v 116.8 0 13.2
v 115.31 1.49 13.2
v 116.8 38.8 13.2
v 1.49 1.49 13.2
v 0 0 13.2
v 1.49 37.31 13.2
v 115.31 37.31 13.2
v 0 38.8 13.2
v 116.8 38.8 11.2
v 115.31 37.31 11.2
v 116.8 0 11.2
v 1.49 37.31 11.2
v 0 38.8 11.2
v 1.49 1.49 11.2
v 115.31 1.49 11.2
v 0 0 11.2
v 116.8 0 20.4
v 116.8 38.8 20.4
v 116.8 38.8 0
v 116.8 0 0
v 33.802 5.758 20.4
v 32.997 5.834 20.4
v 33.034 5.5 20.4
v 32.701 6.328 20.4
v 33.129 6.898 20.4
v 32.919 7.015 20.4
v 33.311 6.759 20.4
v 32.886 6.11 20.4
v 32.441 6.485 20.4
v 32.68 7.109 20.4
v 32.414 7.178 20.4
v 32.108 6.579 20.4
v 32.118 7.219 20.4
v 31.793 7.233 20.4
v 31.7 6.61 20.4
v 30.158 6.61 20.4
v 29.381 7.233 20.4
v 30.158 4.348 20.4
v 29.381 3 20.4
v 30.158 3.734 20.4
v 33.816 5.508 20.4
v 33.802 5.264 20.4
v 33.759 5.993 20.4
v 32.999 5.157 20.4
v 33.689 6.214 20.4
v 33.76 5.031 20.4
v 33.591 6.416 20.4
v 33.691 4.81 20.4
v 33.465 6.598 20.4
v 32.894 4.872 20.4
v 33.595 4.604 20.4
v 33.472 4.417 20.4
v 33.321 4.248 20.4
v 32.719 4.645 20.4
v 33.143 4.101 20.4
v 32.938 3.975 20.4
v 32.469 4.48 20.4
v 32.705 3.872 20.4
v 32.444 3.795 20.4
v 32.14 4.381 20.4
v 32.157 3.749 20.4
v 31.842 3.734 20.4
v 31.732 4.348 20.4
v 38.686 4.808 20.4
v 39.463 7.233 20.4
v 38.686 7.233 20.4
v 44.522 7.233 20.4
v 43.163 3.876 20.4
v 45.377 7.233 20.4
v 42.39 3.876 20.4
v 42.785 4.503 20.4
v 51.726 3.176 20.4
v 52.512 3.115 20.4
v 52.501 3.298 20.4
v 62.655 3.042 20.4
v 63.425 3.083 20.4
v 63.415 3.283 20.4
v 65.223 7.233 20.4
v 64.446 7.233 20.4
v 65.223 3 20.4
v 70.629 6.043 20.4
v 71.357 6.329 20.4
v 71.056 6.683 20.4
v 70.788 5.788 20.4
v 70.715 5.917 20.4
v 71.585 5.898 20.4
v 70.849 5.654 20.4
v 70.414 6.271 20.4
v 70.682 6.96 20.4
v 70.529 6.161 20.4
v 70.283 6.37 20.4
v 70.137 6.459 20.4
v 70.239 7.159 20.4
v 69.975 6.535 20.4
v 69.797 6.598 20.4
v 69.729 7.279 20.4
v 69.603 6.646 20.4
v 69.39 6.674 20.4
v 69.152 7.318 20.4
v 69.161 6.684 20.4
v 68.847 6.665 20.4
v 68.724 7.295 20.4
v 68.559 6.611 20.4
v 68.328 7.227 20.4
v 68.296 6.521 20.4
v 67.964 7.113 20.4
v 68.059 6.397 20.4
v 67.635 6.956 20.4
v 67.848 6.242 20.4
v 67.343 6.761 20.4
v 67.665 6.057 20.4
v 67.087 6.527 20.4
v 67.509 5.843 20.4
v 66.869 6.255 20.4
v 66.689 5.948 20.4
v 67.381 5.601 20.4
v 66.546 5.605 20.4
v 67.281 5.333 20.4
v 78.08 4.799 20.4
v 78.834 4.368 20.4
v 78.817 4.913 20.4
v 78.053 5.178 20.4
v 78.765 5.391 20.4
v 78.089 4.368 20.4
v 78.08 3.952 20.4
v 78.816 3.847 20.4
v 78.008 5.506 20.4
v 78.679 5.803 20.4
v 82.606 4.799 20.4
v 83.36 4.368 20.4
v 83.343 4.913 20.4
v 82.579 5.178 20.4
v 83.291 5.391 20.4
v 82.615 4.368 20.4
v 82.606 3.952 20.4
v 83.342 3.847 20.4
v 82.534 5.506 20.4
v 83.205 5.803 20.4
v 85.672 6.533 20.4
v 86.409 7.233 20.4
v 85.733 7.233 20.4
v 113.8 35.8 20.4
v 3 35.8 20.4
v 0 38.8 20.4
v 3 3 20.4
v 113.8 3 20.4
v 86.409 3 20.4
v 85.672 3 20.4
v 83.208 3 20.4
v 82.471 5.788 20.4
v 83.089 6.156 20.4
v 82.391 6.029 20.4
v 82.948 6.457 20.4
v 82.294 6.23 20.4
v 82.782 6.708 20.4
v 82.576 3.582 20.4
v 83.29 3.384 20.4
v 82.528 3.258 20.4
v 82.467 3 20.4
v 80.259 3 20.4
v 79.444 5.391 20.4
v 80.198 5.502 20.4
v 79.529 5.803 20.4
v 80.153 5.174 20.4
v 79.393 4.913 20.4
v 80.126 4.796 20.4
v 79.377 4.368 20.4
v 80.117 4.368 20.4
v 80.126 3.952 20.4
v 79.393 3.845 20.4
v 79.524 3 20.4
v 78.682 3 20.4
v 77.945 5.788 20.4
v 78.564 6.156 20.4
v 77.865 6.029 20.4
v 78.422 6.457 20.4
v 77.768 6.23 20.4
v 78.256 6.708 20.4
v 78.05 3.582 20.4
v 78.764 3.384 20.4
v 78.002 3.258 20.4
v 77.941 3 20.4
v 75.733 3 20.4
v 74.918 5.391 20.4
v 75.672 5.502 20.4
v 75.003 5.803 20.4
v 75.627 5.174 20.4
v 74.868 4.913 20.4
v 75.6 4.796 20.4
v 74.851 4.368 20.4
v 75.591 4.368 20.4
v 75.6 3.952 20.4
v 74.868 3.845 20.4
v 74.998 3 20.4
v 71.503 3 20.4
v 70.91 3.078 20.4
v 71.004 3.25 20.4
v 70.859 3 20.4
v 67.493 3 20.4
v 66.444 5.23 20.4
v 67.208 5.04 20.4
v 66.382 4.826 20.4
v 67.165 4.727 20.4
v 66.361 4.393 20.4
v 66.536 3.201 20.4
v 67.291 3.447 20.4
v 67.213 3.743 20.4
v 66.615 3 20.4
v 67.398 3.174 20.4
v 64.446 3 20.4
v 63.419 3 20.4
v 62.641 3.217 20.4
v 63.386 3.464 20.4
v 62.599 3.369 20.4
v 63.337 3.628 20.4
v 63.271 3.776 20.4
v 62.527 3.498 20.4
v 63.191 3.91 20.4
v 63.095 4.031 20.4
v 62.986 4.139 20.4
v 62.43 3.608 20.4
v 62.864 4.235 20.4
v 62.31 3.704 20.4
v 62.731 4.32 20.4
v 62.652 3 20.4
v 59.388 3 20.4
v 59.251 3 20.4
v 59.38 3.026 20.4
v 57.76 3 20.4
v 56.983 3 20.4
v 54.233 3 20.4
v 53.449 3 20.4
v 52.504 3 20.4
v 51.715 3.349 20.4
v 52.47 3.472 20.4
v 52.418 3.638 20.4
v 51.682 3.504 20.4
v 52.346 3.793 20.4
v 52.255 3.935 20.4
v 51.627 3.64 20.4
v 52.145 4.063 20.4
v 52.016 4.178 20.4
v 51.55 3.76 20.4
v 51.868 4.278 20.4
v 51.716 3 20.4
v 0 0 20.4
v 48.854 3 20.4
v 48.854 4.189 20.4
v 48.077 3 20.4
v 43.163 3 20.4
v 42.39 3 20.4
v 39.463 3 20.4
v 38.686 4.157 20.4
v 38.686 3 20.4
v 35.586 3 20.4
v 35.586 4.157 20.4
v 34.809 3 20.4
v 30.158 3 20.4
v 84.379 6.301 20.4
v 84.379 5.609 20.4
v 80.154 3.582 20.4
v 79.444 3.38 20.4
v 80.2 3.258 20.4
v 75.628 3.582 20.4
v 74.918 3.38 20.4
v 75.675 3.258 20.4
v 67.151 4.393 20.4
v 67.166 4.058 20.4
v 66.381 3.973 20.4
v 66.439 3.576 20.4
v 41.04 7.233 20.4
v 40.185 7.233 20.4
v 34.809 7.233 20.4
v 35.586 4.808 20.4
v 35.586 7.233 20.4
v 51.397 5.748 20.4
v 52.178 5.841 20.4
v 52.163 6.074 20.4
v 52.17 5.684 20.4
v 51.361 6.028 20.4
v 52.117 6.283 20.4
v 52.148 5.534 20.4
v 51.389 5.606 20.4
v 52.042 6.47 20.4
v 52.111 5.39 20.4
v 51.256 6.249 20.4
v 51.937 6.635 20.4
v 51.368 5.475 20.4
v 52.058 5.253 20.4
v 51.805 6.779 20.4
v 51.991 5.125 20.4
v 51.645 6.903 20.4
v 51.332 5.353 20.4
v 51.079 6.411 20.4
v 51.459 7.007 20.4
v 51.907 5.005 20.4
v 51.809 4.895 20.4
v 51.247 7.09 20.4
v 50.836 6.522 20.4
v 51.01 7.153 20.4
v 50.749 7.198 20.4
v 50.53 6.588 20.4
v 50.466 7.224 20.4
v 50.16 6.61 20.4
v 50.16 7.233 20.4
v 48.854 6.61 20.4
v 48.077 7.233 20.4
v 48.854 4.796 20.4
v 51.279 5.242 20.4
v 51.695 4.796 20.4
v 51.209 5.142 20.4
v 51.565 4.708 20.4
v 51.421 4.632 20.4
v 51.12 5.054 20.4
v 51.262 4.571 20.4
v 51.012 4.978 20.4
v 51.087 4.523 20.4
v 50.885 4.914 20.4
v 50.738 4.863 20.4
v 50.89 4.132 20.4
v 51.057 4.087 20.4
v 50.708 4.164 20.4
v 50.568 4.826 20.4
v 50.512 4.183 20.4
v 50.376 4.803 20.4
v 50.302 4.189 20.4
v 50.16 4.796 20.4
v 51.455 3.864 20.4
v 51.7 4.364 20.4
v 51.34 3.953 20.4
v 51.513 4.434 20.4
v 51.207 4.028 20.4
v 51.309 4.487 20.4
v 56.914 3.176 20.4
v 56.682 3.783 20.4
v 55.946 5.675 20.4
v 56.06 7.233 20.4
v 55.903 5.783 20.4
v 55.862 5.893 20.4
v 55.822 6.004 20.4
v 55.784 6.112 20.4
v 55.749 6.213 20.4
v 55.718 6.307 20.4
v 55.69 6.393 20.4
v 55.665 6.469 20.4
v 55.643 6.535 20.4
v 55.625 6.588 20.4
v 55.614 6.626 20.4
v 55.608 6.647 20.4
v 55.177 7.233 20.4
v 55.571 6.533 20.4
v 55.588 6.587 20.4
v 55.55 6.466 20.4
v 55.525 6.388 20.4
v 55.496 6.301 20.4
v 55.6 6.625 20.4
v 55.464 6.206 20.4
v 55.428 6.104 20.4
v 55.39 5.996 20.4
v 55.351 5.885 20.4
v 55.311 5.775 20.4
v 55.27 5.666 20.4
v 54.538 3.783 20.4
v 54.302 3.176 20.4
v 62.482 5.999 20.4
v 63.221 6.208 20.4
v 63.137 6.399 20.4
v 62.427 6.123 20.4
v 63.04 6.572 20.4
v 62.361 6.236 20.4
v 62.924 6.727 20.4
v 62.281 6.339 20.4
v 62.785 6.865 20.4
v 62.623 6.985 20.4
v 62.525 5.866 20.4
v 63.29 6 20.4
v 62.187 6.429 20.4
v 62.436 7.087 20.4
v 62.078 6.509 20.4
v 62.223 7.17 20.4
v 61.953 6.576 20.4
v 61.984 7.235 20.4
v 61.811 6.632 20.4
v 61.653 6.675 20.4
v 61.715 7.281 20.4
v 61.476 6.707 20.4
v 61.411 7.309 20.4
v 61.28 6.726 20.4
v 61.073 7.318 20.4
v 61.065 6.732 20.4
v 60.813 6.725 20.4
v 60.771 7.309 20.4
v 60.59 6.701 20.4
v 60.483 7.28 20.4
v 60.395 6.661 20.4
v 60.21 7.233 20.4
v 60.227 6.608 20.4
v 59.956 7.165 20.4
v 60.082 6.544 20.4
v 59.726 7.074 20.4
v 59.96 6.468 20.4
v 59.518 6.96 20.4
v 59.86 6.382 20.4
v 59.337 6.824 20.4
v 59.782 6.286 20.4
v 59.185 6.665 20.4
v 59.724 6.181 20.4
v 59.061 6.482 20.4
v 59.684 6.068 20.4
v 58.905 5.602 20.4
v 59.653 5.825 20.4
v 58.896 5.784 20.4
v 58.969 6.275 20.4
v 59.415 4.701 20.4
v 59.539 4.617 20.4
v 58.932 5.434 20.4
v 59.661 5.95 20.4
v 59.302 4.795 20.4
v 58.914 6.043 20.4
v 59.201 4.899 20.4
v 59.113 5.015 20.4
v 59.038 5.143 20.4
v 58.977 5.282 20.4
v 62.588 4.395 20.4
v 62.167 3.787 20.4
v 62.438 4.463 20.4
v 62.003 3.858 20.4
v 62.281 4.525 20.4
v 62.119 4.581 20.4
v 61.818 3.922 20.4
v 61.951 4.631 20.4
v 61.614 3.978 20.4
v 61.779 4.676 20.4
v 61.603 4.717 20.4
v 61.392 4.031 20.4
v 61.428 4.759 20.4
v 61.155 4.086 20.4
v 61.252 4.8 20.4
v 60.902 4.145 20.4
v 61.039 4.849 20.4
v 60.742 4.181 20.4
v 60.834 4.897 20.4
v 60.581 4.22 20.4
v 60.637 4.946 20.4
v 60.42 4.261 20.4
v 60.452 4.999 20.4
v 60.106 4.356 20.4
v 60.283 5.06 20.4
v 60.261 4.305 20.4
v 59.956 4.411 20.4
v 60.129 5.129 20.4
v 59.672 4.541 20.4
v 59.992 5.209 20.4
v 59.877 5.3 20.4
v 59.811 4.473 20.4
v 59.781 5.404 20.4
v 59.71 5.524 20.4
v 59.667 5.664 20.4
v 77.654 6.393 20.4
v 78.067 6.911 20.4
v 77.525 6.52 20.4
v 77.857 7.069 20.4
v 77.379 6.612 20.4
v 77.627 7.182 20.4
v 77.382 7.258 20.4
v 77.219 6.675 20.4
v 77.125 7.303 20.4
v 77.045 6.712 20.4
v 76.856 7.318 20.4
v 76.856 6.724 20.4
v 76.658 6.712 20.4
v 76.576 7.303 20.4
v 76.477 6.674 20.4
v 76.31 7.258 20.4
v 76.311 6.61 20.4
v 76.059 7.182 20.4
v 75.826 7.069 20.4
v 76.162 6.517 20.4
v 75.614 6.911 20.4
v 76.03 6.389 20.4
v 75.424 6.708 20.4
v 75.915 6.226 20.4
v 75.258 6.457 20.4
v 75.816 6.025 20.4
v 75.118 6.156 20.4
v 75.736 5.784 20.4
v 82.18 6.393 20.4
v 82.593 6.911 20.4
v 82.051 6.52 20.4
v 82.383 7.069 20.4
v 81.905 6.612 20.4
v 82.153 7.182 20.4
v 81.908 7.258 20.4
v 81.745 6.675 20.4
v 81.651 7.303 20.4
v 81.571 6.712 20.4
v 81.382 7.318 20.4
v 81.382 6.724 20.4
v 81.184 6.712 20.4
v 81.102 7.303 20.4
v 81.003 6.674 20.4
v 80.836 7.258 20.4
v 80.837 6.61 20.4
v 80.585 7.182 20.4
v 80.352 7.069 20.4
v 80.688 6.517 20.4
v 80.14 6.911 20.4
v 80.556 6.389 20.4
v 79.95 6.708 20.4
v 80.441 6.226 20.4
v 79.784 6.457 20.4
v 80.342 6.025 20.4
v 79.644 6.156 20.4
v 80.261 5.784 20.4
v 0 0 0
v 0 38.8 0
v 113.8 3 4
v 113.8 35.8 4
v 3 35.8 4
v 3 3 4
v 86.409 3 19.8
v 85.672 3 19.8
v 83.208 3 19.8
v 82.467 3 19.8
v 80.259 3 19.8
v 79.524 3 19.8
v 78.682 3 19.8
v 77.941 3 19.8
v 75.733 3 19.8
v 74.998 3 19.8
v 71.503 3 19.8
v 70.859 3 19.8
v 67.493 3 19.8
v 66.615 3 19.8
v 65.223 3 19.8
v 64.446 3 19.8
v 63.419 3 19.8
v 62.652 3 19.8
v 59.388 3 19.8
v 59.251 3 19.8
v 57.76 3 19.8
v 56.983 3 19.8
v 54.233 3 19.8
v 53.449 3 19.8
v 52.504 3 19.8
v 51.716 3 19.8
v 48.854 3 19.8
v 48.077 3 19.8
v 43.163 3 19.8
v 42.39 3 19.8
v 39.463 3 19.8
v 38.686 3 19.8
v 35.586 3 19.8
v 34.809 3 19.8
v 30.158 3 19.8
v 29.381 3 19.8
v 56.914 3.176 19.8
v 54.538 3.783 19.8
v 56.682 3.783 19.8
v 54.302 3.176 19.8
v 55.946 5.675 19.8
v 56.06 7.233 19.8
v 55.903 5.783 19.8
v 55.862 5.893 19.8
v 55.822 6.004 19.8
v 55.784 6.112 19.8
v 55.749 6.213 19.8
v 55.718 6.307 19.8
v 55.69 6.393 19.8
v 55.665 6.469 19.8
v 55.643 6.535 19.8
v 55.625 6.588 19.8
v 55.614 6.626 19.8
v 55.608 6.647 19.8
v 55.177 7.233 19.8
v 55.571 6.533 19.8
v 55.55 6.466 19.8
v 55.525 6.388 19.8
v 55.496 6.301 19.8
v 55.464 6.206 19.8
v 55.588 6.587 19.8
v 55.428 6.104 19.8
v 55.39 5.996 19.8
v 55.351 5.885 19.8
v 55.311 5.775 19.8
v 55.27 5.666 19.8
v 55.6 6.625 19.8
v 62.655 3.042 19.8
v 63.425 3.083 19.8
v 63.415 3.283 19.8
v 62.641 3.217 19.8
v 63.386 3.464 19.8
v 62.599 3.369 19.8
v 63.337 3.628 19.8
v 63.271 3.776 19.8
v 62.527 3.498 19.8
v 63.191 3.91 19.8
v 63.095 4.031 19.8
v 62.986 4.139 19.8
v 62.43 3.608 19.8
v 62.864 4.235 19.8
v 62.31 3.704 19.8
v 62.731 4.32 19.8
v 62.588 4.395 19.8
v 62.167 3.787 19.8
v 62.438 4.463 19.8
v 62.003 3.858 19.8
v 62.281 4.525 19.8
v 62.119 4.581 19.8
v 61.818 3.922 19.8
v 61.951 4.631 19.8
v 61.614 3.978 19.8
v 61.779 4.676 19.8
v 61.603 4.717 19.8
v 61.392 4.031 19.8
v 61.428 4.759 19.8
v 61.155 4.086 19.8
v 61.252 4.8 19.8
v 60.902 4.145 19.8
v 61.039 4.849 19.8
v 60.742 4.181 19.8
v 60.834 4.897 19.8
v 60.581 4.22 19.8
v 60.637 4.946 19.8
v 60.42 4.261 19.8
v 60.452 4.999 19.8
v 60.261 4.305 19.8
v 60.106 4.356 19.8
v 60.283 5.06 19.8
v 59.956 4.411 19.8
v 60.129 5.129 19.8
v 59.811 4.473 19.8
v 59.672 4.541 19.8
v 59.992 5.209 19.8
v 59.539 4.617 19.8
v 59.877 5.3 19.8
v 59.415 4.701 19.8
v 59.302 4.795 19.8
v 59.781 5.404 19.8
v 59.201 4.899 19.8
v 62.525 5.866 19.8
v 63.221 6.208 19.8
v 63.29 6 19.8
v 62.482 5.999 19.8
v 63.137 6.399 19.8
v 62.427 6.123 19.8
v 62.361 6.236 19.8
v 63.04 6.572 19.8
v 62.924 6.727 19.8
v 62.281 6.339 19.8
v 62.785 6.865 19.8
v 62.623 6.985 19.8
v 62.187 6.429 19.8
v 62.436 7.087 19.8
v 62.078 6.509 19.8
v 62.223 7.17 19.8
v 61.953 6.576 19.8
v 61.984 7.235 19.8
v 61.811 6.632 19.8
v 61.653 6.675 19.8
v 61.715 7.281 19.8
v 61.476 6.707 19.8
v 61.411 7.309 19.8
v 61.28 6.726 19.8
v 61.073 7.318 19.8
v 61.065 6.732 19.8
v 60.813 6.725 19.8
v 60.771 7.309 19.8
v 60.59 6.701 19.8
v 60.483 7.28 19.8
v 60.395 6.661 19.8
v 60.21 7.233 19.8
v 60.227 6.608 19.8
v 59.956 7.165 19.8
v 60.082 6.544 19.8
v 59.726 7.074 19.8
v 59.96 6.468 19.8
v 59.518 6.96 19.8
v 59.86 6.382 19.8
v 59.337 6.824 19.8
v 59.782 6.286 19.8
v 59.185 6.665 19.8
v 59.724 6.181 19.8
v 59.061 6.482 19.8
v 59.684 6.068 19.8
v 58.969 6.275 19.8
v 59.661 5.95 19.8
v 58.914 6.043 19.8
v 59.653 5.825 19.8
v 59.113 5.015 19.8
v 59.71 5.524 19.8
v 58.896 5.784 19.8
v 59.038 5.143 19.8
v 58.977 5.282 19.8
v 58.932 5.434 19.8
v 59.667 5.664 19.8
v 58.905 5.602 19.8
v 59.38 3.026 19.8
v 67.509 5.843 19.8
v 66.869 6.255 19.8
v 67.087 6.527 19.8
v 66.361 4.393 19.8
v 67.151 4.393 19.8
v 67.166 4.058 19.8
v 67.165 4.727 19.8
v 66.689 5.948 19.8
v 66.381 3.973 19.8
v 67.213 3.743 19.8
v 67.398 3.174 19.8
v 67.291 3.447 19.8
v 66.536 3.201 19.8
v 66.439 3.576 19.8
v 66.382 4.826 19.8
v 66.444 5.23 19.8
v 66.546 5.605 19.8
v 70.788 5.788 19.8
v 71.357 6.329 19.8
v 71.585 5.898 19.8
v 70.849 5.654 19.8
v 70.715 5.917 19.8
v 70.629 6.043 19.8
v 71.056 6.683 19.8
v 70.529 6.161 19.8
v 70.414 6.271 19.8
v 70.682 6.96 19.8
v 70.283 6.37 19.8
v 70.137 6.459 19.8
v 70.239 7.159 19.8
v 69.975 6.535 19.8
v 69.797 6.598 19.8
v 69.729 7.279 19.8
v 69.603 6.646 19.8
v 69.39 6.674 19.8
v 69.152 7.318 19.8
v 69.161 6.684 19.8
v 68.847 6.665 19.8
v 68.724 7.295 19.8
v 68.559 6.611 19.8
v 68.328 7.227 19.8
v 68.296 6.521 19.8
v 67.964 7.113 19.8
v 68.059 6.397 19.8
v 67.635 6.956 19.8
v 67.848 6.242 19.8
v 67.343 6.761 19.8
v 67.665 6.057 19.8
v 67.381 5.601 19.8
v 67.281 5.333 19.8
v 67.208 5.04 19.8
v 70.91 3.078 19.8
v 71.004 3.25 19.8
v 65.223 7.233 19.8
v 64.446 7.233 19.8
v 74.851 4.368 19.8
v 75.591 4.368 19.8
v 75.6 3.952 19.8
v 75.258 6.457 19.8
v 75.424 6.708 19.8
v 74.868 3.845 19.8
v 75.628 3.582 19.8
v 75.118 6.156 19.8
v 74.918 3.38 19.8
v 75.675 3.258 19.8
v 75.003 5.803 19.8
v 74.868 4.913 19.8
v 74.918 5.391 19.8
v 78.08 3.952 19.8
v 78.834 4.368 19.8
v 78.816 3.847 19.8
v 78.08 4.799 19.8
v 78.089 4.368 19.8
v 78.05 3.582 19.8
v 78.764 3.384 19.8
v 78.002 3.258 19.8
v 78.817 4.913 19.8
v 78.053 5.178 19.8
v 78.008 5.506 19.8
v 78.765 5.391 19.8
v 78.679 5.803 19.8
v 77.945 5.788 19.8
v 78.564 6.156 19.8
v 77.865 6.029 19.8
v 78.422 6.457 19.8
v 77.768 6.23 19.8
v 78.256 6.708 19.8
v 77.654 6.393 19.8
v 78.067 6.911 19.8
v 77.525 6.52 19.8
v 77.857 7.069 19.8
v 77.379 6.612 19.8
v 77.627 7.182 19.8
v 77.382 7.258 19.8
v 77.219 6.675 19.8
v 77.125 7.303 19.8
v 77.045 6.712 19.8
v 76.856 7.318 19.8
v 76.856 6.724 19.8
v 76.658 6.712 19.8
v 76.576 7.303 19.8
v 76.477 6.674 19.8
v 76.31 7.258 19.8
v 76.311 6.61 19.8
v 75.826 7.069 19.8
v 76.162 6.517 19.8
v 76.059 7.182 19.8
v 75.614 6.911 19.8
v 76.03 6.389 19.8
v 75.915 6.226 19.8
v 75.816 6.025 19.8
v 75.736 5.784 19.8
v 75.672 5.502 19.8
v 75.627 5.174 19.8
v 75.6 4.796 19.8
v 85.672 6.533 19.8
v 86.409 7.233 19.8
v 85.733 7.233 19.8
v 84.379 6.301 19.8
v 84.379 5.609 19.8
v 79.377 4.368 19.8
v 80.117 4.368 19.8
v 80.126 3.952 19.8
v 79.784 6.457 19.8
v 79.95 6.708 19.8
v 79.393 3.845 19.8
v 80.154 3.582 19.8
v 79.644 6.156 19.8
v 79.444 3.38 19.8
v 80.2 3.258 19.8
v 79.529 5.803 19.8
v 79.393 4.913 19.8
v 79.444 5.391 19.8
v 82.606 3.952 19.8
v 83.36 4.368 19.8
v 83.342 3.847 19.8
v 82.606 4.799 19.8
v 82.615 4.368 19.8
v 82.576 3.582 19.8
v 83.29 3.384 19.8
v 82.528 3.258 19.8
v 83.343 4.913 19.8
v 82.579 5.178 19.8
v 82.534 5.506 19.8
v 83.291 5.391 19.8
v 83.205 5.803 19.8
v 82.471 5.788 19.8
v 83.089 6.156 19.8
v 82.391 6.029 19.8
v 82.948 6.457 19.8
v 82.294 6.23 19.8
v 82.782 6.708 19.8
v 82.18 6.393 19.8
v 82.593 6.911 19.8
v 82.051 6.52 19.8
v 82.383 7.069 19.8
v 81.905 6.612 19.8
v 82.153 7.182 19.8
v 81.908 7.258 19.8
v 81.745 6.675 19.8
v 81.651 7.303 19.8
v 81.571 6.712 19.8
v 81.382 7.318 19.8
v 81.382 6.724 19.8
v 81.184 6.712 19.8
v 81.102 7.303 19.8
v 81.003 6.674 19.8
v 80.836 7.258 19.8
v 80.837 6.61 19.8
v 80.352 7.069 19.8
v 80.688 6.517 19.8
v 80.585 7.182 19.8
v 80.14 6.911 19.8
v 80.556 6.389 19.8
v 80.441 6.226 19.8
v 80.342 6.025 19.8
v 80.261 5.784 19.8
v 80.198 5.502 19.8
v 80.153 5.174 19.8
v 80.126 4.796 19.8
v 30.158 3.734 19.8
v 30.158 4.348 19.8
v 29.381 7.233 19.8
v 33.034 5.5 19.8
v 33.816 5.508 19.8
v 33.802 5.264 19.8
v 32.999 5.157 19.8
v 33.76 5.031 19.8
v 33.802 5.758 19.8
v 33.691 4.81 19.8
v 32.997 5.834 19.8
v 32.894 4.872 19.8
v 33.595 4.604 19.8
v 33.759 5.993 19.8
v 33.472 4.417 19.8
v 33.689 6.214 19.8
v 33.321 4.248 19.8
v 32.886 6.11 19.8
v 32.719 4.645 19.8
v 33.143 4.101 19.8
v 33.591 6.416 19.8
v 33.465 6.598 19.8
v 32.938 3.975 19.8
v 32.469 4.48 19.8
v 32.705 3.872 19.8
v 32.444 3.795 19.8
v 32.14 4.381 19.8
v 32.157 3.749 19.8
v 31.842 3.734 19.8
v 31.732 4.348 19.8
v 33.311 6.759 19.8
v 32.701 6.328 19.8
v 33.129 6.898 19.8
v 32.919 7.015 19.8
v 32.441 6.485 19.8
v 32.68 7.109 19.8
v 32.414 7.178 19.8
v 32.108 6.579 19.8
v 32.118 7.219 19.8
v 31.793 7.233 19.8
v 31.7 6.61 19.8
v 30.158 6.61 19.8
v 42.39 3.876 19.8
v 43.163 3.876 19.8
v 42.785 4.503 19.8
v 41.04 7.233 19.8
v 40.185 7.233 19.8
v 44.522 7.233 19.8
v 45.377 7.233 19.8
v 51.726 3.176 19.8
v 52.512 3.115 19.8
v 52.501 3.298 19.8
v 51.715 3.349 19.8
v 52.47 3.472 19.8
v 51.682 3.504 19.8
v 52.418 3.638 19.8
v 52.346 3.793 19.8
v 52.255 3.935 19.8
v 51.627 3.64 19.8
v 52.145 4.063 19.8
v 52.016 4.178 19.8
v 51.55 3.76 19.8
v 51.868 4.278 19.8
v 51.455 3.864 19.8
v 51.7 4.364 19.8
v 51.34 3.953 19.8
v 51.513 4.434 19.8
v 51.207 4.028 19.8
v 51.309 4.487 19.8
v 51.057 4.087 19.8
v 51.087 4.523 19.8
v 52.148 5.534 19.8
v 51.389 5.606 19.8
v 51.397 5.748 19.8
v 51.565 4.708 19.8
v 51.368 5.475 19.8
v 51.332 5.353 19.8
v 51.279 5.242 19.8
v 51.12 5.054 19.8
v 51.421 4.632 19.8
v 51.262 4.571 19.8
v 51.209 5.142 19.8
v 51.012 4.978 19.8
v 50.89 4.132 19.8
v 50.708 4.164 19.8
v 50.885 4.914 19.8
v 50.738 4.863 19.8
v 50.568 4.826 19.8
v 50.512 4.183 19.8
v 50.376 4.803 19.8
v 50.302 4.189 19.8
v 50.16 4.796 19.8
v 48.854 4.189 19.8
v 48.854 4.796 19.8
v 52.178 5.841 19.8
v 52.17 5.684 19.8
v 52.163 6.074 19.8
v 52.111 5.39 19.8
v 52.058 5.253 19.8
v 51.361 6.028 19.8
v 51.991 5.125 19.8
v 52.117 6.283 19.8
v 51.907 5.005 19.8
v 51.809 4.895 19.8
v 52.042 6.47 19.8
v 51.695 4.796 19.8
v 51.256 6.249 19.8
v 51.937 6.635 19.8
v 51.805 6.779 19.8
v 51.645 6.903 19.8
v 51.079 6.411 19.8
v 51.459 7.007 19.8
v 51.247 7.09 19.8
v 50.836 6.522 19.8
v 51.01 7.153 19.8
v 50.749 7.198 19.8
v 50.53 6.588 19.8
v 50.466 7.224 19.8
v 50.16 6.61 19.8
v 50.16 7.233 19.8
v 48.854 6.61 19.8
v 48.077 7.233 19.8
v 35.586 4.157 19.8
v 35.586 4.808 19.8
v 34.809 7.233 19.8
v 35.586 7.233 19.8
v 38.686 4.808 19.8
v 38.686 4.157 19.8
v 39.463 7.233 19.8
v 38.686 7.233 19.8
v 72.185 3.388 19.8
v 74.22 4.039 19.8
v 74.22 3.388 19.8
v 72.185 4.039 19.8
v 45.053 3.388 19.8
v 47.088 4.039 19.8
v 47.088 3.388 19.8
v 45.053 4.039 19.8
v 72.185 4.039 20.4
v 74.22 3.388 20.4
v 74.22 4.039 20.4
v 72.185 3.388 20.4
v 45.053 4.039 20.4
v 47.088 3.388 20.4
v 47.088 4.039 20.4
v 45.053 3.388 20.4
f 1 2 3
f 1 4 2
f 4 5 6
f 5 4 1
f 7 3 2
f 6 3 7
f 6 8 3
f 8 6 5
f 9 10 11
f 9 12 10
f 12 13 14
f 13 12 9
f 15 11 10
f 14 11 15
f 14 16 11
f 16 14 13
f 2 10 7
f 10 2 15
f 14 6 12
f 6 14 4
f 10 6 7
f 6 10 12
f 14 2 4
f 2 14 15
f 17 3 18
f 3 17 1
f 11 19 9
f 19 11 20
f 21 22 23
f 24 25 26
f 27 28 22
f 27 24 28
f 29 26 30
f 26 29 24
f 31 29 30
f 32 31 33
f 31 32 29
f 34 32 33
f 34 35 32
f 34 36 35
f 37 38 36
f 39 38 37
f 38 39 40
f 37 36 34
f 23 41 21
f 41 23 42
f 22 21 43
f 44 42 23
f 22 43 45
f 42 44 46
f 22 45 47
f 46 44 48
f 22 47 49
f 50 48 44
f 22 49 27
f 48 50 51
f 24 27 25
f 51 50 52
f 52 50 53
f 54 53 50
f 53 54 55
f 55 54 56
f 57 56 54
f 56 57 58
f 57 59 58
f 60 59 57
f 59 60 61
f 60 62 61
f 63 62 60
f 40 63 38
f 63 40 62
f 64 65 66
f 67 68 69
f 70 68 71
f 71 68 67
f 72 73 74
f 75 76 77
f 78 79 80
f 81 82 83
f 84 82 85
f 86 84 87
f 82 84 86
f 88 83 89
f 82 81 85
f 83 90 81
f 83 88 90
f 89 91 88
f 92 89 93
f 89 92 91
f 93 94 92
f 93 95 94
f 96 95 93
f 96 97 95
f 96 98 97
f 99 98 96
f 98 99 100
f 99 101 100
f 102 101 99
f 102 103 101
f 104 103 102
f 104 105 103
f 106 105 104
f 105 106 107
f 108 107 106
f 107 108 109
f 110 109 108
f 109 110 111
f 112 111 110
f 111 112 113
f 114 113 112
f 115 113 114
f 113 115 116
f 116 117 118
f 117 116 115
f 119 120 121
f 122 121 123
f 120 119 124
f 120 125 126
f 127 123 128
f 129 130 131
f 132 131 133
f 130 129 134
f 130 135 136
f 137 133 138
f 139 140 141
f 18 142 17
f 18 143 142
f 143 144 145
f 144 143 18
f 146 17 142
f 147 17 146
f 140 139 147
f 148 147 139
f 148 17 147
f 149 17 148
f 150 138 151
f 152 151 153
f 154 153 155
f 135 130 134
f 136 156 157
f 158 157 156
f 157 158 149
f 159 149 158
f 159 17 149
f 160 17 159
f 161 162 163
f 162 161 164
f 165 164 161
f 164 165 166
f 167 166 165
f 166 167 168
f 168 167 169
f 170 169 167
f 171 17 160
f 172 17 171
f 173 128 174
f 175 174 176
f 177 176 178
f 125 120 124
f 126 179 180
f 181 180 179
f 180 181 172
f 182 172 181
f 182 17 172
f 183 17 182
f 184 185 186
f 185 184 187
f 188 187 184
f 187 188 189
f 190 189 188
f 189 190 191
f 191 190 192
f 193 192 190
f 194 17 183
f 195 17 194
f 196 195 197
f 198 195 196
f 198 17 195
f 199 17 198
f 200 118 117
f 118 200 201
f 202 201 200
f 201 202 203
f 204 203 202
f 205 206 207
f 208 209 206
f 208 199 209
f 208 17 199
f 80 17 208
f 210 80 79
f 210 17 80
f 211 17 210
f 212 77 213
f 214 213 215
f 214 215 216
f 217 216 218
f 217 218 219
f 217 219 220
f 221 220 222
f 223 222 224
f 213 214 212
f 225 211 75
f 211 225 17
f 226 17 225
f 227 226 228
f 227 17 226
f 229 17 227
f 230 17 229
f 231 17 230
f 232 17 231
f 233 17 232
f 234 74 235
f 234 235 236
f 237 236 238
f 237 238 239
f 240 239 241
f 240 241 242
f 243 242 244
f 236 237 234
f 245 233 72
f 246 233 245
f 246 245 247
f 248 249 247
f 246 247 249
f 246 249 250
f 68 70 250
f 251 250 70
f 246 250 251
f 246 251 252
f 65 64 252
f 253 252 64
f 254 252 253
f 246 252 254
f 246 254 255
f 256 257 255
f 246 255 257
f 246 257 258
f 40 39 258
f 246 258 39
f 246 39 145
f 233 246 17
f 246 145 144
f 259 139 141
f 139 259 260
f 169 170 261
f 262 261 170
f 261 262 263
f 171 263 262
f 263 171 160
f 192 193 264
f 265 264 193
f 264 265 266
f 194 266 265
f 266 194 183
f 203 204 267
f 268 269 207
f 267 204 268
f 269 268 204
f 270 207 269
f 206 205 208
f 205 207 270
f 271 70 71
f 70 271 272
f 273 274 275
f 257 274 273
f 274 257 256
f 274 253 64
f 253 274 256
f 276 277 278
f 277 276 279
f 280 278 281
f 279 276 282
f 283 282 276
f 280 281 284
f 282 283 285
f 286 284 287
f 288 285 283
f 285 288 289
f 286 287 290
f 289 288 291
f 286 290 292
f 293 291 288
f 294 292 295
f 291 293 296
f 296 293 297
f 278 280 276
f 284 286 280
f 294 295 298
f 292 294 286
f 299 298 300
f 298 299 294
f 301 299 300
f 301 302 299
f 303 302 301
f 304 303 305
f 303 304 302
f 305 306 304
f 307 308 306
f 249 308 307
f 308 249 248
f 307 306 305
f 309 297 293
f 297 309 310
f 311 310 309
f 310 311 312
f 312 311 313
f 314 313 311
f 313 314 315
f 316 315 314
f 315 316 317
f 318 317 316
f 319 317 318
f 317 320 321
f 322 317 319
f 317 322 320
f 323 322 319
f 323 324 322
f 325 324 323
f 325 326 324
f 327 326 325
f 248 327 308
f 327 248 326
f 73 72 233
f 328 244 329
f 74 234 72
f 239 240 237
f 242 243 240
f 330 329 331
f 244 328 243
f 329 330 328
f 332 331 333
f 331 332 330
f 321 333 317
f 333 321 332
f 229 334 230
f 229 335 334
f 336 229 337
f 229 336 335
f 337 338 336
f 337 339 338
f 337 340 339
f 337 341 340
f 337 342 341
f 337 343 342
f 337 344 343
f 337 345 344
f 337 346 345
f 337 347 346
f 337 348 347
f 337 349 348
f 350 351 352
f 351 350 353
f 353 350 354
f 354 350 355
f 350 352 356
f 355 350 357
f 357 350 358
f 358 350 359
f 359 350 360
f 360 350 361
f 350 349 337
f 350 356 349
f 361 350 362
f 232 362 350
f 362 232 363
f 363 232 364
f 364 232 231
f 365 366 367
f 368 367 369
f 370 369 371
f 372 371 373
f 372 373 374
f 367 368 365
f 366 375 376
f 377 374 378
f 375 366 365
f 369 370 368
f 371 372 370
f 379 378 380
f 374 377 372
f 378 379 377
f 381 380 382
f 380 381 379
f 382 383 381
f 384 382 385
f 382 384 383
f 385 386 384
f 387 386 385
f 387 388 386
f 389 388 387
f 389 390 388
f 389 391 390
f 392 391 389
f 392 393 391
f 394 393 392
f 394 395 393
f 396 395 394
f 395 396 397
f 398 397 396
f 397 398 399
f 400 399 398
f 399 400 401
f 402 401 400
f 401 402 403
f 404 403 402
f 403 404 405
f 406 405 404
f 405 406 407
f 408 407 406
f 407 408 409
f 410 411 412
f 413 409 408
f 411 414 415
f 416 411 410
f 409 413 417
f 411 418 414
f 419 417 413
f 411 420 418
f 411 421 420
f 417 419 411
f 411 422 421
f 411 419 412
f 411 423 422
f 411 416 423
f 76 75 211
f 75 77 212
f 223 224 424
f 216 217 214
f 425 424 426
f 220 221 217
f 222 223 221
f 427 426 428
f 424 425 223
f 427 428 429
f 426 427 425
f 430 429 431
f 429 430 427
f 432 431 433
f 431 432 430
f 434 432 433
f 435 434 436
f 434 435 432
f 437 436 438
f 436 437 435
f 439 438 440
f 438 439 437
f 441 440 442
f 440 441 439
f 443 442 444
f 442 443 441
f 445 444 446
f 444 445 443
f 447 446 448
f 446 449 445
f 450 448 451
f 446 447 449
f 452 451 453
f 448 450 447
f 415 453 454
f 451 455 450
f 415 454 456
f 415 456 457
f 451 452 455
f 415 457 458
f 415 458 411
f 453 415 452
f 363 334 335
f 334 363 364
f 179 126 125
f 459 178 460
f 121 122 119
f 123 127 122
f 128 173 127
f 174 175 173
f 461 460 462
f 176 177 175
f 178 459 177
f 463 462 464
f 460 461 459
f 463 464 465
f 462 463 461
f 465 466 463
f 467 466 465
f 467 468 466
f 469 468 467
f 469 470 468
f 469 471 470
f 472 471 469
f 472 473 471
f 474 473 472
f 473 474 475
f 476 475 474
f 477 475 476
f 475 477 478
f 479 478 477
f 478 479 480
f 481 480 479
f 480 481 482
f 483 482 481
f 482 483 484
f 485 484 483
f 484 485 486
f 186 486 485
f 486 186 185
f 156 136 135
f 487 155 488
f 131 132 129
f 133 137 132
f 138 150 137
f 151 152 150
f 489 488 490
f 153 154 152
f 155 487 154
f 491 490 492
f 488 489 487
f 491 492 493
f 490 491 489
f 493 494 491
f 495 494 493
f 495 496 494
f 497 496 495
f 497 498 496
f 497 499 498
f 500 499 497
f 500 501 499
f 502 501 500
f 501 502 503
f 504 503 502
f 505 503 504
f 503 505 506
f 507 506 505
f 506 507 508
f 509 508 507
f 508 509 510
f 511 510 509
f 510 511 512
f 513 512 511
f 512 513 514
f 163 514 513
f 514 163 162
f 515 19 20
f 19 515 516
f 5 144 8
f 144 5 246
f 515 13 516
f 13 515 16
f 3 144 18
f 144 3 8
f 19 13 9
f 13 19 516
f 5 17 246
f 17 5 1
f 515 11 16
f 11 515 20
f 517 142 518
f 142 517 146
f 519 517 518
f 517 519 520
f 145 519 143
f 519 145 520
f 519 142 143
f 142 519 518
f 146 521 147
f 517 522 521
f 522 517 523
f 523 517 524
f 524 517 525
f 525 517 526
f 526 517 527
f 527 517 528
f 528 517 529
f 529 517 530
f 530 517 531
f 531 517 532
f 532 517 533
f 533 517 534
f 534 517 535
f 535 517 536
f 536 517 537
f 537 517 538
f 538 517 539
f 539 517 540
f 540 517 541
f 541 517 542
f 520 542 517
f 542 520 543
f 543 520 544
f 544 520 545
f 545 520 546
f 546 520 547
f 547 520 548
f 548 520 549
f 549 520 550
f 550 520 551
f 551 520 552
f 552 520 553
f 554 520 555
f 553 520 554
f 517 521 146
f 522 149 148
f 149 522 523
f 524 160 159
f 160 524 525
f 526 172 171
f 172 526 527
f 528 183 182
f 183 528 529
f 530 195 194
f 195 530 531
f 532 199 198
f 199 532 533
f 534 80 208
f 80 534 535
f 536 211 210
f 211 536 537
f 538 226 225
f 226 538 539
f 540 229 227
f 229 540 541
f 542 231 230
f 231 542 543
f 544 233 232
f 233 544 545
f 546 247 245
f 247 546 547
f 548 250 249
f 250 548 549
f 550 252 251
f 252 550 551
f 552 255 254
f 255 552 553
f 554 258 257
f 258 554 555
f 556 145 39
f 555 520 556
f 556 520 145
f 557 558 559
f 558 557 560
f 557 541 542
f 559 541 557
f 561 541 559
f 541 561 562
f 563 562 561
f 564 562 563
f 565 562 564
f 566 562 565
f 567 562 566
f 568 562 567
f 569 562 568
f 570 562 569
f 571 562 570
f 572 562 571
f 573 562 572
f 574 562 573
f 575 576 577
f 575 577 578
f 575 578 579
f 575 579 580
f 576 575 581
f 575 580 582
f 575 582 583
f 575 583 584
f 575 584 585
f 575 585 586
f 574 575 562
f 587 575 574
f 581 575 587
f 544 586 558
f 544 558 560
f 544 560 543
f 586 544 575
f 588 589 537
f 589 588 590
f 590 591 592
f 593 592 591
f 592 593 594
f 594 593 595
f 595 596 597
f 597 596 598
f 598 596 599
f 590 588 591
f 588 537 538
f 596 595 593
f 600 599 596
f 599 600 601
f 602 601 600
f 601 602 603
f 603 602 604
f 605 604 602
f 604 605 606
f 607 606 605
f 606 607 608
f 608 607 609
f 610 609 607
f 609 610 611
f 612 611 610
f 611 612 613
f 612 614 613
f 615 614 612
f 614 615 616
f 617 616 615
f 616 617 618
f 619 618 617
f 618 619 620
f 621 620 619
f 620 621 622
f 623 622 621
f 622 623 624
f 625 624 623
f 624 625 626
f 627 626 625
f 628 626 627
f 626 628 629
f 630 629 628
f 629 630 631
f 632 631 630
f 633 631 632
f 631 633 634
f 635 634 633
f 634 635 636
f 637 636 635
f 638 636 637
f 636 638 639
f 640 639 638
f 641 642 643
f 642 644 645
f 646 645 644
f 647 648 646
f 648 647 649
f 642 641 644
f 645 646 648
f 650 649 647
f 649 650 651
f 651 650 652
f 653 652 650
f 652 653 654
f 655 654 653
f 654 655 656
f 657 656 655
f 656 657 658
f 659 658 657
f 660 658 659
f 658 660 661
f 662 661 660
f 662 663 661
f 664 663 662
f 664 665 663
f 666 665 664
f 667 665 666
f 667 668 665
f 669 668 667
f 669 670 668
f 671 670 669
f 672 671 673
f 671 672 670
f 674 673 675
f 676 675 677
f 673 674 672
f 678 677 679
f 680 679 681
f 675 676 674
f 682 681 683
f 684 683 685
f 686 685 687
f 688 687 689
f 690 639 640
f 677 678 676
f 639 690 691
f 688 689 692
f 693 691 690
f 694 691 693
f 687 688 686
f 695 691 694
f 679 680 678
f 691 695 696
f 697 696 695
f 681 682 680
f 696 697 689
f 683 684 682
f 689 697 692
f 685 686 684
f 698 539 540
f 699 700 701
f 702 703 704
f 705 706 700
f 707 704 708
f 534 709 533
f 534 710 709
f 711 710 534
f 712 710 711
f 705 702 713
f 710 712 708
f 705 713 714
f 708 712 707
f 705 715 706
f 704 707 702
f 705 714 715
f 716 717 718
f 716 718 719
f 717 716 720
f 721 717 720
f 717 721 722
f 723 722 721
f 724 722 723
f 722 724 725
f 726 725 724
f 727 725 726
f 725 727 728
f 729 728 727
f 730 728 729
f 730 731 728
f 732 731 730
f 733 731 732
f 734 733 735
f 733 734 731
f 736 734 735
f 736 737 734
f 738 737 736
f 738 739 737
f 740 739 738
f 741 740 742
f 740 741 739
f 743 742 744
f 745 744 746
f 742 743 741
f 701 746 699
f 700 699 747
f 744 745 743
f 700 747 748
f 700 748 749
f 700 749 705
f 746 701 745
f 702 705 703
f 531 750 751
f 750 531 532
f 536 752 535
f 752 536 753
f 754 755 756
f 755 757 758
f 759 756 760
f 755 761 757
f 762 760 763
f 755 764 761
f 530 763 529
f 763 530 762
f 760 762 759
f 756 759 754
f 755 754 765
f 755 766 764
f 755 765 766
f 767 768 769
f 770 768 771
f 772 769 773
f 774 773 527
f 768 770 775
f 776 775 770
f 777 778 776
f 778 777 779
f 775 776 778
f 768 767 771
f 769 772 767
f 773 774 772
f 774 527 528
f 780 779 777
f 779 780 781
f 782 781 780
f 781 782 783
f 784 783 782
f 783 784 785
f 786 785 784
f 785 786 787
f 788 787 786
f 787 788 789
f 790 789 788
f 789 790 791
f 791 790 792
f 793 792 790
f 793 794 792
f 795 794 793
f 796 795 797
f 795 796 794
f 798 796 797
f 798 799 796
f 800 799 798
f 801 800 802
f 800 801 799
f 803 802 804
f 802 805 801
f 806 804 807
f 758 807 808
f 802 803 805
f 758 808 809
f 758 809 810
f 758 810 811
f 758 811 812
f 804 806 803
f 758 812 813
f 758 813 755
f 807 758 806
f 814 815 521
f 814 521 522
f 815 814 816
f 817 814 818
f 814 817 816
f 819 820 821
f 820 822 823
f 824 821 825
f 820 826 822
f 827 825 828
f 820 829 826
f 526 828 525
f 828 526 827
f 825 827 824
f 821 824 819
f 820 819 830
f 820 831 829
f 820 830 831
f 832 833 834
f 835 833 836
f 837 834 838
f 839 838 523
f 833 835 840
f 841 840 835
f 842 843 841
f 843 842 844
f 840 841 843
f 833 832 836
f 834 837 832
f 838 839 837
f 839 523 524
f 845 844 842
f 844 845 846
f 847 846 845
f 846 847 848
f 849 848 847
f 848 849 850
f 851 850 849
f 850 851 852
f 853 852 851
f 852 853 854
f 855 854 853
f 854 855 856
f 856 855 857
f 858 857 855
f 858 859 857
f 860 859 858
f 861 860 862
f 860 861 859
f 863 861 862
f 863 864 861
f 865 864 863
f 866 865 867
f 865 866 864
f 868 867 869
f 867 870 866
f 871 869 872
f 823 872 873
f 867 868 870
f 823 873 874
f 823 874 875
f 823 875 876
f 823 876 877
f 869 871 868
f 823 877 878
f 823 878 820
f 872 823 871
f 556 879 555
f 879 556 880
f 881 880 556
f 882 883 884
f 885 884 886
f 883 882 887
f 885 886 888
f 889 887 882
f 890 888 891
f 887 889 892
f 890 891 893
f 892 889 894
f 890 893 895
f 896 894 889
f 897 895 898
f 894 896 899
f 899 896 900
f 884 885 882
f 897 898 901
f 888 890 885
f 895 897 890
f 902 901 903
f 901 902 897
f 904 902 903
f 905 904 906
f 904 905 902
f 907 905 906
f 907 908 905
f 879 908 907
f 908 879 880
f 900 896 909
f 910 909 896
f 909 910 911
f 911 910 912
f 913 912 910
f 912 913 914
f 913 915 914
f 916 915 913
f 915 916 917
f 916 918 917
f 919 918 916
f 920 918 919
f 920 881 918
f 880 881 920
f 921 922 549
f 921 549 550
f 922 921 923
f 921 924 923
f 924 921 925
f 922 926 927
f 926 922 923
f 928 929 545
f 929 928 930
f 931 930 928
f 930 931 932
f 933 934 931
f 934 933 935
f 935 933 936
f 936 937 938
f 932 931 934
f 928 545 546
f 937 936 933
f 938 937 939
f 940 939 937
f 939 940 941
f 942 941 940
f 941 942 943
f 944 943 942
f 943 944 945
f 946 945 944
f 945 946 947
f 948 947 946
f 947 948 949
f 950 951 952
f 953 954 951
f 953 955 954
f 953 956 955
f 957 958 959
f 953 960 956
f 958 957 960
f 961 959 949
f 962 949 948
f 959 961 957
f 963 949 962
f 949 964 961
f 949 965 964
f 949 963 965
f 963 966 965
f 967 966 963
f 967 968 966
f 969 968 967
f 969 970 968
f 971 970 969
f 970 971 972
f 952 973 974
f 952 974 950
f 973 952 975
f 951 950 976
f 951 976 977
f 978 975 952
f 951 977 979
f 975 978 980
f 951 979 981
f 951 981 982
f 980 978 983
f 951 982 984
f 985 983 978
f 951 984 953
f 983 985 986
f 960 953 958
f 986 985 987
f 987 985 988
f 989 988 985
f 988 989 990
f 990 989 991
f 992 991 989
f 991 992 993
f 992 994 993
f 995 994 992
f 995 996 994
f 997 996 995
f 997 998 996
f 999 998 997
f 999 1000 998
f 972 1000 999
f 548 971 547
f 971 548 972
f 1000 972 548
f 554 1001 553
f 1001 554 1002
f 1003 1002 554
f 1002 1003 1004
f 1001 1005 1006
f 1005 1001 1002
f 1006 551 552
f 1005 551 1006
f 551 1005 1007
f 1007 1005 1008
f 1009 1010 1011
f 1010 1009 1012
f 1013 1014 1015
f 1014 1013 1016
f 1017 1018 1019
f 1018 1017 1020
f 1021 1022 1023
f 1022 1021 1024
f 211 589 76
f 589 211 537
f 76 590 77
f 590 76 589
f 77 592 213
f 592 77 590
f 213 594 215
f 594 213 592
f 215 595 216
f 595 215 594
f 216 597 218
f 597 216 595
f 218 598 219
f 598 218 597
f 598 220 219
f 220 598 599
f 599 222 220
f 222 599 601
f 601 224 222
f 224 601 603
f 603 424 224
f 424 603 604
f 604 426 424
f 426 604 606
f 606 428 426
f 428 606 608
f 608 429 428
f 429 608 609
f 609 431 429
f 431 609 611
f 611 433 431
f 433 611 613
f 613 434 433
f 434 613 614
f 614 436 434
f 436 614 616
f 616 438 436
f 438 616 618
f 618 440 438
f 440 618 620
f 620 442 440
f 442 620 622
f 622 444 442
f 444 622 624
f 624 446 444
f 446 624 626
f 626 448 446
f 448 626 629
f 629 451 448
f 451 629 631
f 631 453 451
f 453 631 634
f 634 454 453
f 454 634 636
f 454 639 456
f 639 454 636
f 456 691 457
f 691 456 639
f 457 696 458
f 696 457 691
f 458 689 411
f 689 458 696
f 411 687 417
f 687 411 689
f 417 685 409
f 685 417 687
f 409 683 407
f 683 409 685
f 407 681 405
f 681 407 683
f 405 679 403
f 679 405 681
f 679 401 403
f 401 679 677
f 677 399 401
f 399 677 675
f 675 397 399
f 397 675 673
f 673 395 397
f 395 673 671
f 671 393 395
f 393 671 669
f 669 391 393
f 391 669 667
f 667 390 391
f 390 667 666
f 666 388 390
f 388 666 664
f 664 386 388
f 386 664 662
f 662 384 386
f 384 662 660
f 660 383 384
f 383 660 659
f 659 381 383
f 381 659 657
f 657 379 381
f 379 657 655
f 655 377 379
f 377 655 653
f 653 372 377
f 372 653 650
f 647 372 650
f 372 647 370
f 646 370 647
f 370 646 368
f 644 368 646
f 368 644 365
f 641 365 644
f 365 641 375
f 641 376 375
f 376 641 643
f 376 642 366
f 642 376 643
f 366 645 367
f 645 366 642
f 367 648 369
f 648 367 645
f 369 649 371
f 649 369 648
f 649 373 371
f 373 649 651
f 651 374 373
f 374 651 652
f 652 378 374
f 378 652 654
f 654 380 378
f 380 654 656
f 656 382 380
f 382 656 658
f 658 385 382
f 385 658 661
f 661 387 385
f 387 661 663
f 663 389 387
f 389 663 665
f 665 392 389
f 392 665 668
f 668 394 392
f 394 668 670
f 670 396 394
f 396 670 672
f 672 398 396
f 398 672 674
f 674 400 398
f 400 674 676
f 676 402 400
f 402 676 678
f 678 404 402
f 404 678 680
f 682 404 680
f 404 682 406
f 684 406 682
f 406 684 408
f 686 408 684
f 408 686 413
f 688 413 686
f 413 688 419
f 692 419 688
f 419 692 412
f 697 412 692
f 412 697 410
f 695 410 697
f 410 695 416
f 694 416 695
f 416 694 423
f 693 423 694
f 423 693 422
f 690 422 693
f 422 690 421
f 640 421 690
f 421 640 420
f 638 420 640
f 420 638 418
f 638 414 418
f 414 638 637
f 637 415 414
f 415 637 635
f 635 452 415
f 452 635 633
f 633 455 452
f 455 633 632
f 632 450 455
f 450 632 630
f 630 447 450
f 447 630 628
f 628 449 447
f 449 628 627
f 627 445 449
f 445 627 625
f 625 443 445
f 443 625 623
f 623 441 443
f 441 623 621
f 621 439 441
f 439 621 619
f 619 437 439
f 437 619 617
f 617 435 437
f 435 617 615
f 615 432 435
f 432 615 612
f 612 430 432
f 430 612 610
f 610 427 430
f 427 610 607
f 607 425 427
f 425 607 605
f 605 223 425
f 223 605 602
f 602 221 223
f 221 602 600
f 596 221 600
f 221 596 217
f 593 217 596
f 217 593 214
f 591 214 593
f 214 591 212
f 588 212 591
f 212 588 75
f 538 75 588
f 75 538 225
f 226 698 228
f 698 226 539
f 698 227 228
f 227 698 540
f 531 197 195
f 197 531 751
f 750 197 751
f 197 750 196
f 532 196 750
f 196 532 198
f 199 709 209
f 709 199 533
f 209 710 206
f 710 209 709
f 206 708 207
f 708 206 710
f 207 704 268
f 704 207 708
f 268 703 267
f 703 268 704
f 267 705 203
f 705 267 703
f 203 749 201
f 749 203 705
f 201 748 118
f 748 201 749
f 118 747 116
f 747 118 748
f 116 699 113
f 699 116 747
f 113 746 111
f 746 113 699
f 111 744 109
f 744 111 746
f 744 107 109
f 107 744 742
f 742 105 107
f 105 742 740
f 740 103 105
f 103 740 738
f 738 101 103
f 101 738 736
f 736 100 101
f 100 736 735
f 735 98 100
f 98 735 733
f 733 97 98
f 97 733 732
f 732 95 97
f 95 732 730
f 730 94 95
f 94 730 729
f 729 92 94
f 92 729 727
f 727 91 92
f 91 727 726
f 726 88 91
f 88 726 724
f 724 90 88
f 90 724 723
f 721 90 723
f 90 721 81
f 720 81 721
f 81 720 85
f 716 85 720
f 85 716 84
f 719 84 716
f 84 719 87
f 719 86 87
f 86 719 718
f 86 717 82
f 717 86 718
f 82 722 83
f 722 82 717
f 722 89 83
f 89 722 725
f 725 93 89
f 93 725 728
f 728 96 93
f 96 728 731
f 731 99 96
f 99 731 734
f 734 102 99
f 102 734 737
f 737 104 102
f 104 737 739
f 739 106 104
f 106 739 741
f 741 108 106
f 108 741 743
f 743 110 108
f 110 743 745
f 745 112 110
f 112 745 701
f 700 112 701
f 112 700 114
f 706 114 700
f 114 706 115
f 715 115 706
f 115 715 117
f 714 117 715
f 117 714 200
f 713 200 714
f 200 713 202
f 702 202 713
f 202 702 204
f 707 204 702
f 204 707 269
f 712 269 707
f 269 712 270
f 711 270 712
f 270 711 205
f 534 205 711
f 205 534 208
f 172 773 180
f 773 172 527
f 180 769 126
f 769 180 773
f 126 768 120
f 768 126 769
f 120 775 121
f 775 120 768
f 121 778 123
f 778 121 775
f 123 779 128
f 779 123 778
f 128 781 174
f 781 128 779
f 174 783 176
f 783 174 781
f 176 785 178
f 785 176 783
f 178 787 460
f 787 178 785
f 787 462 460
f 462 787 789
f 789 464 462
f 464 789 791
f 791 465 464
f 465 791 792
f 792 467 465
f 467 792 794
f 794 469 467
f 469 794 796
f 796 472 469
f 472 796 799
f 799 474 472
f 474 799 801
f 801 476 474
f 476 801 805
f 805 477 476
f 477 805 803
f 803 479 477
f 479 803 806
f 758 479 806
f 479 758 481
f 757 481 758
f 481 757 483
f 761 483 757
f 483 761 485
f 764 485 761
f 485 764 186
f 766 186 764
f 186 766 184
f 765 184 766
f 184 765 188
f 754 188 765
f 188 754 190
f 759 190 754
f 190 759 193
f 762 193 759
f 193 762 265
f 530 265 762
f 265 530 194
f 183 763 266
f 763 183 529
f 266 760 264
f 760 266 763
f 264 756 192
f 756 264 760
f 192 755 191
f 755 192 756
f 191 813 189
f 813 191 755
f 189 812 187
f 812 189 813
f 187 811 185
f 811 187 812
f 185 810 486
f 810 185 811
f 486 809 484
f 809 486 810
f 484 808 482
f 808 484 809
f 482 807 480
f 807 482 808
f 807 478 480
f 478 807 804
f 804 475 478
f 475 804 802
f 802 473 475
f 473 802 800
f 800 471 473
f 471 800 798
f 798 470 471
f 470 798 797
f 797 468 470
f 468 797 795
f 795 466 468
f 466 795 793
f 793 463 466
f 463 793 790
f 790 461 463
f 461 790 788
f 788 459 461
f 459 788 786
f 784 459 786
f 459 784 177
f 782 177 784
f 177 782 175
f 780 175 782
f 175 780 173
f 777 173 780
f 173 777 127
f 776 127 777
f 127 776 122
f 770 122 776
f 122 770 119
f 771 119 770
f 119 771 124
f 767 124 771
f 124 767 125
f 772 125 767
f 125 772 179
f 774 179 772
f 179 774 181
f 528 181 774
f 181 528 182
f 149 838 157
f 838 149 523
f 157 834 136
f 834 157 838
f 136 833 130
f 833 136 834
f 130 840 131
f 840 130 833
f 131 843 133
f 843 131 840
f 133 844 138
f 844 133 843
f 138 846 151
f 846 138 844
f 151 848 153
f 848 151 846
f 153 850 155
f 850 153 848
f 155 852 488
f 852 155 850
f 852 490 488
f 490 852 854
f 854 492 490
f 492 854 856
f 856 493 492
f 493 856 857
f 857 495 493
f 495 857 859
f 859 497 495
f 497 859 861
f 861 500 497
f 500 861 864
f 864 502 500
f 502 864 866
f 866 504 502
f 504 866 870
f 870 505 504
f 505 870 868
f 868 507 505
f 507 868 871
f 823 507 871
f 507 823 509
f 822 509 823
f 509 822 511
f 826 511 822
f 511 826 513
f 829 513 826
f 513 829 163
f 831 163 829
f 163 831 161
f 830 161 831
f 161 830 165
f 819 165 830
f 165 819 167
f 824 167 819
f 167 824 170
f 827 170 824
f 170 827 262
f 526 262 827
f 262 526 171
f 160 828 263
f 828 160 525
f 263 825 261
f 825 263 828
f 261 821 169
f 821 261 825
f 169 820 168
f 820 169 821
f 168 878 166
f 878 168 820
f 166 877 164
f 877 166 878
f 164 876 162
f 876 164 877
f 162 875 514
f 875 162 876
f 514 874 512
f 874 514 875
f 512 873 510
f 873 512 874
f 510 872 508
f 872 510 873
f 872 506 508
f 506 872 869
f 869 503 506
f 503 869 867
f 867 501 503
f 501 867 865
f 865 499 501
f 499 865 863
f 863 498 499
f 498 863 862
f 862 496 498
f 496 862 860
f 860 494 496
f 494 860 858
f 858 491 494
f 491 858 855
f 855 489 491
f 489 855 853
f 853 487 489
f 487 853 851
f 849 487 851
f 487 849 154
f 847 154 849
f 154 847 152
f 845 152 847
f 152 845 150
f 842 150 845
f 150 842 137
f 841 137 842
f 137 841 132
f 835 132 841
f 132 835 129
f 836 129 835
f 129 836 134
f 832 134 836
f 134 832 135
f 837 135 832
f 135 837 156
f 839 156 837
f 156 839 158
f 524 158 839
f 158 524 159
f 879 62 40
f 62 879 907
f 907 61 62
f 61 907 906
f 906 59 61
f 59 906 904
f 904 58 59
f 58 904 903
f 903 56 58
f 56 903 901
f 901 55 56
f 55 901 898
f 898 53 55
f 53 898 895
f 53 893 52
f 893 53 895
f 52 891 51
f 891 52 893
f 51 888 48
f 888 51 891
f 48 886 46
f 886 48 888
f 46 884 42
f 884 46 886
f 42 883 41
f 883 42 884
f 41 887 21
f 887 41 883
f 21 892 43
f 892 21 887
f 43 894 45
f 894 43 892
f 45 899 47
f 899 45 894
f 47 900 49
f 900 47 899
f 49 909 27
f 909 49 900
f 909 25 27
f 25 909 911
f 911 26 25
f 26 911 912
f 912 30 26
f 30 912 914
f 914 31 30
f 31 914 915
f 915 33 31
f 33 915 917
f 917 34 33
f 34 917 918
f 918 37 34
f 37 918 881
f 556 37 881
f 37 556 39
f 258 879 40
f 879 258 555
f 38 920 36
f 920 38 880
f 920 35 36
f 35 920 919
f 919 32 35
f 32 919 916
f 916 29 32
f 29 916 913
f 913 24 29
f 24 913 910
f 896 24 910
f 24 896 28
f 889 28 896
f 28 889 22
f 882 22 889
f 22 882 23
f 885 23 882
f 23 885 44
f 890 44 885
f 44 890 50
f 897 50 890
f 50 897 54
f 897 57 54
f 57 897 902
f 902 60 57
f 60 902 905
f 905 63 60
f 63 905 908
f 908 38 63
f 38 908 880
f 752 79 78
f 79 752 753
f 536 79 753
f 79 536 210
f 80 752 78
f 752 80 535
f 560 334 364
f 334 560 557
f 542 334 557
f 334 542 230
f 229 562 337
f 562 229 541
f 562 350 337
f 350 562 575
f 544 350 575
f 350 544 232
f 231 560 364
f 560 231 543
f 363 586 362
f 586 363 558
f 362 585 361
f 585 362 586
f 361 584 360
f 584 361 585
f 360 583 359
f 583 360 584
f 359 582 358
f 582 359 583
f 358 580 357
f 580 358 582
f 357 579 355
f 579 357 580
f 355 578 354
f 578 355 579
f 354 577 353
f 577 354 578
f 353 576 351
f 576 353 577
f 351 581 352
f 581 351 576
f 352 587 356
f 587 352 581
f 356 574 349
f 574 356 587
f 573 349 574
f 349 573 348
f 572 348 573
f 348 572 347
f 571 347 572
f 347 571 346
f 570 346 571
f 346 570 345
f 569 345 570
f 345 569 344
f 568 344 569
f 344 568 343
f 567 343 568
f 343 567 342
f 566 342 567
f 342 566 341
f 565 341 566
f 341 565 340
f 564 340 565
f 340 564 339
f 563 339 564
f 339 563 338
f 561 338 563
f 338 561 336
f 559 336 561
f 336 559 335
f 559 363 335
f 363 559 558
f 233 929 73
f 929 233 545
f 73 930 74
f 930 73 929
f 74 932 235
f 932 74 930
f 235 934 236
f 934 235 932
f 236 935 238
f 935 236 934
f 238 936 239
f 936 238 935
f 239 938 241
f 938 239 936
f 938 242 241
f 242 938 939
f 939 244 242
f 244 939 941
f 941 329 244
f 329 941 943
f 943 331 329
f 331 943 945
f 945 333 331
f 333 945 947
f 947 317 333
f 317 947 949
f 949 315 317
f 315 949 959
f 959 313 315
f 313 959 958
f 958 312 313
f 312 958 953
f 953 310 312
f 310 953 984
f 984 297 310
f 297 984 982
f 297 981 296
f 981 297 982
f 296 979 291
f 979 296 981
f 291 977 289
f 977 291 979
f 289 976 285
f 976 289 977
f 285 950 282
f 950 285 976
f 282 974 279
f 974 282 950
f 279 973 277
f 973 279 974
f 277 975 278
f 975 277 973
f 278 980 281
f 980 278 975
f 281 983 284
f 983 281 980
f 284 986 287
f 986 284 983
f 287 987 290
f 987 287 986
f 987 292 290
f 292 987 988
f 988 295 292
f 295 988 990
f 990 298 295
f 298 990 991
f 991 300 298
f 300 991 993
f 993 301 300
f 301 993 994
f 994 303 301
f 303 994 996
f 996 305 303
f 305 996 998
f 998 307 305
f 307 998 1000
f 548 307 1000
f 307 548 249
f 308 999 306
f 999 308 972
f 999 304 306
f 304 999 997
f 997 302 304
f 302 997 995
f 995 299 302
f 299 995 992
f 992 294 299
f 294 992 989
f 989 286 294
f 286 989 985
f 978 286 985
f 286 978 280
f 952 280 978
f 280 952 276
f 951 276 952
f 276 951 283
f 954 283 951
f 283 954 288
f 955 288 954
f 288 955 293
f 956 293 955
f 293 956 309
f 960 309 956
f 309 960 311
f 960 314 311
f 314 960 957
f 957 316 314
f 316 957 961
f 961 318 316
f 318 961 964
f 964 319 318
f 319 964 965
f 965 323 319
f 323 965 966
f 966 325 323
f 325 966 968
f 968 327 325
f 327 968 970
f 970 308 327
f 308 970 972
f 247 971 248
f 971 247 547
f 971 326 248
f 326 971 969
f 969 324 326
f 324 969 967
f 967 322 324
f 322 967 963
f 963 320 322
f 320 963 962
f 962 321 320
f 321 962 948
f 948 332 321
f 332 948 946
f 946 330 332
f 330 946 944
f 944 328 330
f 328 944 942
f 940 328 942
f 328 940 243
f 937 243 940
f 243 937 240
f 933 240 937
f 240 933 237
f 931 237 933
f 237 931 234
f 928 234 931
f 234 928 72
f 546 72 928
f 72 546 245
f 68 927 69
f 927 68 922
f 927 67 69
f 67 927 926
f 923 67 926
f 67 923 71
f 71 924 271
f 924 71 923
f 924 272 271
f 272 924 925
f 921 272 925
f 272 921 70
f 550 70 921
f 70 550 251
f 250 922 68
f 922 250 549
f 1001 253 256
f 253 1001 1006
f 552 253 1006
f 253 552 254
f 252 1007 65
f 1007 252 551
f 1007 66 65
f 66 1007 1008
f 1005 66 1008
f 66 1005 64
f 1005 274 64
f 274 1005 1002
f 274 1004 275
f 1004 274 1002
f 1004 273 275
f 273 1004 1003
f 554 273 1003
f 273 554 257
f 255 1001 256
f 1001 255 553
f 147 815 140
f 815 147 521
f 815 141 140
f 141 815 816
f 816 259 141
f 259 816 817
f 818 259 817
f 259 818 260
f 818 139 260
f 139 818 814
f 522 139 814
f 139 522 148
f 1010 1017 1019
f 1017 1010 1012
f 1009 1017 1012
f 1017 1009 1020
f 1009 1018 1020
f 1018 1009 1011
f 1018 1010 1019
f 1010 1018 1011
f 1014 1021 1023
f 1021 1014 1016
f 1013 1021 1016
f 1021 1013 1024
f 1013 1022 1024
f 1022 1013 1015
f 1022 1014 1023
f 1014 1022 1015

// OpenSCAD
// RGCS Phyrll generator holder — design PHY-BASIC-001
// source specimen: CRY-NODES-001
// generated by rgcs_desktop.services.phyrll_generator (deterministic)
// model output — an engineering plan, not a measurement

cavity_l = 110.800;
cavity_w = 32.800;
cavity_d = 16.400;
outer_l = 116.800;
outer_w = 38.800;
outer_h = 20.400;
wall = 3.000;
base = 4.000;

difference() {
    // body
    cube([outer_l, outer_w, outer_h]);
    // crystal cavity (cradle)
    translate([wall, wall, base])
        cube([cavity_l, cavity_w, cavity_d + 0.01]);
    // coil channel around the outside walls
    translate([-0.01, -0.01, base + cavity_d / 2 - 1.000])
        difference() {
            cube([outer_l + 0.02, outer_w + 0.02, 2.000]);
            translate([1.500, 1.500, -0.01])
                cube([outer_l + 0.02 - 2 * 1.500, outer_w + 0.02 - 2 * 1.500, 2.000 + 0.02]);
        }
}

// label: PHY-BASIC-001
translate([outer_l / 2, wall / 2, outer_h - 0.6])
    linear_extrude(0.6)
        text("PHY-BASIC-001", size = 6, halign = "center");
